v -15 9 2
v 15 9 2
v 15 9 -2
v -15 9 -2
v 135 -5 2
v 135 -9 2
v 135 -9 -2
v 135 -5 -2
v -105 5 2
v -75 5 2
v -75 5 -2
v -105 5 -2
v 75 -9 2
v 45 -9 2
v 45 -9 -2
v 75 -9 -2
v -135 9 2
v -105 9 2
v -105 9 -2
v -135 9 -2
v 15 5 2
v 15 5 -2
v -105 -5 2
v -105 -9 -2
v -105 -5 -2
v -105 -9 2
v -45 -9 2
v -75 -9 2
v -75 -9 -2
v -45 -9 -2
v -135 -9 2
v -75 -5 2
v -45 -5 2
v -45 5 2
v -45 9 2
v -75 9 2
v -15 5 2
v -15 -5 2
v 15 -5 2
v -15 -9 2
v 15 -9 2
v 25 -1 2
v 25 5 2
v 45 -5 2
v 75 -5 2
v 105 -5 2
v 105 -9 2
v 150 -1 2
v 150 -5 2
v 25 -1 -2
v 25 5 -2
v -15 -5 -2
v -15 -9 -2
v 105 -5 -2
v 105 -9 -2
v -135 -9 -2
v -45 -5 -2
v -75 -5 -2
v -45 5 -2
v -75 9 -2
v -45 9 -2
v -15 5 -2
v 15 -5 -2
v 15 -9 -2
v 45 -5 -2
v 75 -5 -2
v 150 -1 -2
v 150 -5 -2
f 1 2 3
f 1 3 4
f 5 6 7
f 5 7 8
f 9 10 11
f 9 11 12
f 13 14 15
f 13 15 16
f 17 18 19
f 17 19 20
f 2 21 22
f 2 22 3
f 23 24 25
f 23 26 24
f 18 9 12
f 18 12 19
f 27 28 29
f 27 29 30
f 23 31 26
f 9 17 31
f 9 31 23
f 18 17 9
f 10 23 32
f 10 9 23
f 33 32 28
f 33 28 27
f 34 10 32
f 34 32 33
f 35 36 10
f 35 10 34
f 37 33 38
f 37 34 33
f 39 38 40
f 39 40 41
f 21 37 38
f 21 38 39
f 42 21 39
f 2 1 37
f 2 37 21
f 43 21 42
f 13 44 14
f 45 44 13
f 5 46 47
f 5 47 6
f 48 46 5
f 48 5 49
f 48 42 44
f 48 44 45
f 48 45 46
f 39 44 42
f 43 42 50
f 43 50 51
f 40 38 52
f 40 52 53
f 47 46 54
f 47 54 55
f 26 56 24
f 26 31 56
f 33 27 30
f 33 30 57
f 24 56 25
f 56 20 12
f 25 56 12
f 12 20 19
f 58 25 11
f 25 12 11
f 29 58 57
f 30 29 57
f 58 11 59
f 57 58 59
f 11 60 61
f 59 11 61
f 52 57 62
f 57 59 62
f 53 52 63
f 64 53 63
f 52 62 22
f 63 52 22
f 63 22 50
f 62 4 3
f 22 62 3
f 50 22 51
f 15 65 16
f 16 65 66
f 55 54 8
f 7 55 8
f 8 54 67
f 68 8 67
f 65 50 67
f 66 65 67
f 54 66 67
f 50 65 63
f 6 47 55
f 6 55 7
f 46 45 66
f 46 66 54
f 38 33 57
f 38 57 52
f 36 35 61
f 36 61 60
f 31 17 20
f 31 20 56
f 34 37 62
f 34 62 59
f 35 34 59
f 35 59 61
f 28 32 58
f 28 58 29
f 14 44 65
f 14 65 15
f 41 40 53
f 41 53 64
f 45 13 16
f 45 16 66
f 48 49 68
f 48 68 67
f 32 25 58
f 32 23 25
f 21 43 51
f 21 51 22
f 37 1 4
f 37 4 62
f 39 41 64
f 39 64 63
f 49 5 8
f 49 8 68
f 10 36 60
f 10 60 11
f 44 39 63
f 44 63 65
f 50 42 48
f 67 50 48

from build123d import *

# Parameters (mm, degrees)
BOSS_EXTRUDE1_DEPTH = 2
CUT_EXTRUDE1_REACH  = 137.359
SKETCH2_W           = 110
SKETCH2_H           = 10
SKETCH3_W           = 15
SKETCH3_H           = 4
BOSS_EXTRUDE2_DEPTH = 4


with BuildPart() as part:
    # Sketch1 → Boss-Extrude1 (new, symmetric)
    with BuildSketch(Plane.XY):
        Polygon((-105, -5), (-75, -5), (-75, -9), (-45, -9), (-45, -5), (-15, -5), (-15, -9), (15, -9), (15, -5), (45, -5), (45, -9), (75, -9), (75, -5), (105, -5), (105, -9), (135, -9), (135, -5), (135, 5), (135, 9), (105, 9), (105, 5), (75, 5), (75, 9), (45, 9), (45, 5), (15, 5), (15, 9), (-15, 9), (-15, 5), (-45, 5), (-45, 9), (-75, 9), (-75, 5), (-105, 5), (-105, 9), (-135, 9), (-135, 5), (-135, -5), (-135, -9), (-105, -9), align=None)
    extrude(amount=BOSS_EXTRUDE1_DEPTH, both=True)

    # Sketch2 → Cut-Extrude1 (cut, up to next)
    with BuildSketch(Plane.XY.offset(2), mode=Mode.PRIVATE) as cut_extrude1_sk1:
        with Locations((80, 4)):
            Rectangle(SKETCH2_W, SKETCH2_H)
    cut_extrude1_tool1 = extrude(cut_extrude1_sk1.sketch, amount=-CUT_EXTRUDE1_REACH, mode=Mode.PRIVATE) & part.part
    add(cut_extrude1_tool1.solids().sort_by_distance((80, 4, 2))[0], mode=Mode.SUBTRACT)

    # Sketch3 → Boss-Extrude2 (add)
    with BuildSketch(Plane.XY.offset(2)):
        with Locations((142.5, -3)):
            Rectangle(SKETCH3_W, SKETCH3_H)
    extrude(amount=-BOSS_EXTRUDE2_DEPTH)


solid = part.part
